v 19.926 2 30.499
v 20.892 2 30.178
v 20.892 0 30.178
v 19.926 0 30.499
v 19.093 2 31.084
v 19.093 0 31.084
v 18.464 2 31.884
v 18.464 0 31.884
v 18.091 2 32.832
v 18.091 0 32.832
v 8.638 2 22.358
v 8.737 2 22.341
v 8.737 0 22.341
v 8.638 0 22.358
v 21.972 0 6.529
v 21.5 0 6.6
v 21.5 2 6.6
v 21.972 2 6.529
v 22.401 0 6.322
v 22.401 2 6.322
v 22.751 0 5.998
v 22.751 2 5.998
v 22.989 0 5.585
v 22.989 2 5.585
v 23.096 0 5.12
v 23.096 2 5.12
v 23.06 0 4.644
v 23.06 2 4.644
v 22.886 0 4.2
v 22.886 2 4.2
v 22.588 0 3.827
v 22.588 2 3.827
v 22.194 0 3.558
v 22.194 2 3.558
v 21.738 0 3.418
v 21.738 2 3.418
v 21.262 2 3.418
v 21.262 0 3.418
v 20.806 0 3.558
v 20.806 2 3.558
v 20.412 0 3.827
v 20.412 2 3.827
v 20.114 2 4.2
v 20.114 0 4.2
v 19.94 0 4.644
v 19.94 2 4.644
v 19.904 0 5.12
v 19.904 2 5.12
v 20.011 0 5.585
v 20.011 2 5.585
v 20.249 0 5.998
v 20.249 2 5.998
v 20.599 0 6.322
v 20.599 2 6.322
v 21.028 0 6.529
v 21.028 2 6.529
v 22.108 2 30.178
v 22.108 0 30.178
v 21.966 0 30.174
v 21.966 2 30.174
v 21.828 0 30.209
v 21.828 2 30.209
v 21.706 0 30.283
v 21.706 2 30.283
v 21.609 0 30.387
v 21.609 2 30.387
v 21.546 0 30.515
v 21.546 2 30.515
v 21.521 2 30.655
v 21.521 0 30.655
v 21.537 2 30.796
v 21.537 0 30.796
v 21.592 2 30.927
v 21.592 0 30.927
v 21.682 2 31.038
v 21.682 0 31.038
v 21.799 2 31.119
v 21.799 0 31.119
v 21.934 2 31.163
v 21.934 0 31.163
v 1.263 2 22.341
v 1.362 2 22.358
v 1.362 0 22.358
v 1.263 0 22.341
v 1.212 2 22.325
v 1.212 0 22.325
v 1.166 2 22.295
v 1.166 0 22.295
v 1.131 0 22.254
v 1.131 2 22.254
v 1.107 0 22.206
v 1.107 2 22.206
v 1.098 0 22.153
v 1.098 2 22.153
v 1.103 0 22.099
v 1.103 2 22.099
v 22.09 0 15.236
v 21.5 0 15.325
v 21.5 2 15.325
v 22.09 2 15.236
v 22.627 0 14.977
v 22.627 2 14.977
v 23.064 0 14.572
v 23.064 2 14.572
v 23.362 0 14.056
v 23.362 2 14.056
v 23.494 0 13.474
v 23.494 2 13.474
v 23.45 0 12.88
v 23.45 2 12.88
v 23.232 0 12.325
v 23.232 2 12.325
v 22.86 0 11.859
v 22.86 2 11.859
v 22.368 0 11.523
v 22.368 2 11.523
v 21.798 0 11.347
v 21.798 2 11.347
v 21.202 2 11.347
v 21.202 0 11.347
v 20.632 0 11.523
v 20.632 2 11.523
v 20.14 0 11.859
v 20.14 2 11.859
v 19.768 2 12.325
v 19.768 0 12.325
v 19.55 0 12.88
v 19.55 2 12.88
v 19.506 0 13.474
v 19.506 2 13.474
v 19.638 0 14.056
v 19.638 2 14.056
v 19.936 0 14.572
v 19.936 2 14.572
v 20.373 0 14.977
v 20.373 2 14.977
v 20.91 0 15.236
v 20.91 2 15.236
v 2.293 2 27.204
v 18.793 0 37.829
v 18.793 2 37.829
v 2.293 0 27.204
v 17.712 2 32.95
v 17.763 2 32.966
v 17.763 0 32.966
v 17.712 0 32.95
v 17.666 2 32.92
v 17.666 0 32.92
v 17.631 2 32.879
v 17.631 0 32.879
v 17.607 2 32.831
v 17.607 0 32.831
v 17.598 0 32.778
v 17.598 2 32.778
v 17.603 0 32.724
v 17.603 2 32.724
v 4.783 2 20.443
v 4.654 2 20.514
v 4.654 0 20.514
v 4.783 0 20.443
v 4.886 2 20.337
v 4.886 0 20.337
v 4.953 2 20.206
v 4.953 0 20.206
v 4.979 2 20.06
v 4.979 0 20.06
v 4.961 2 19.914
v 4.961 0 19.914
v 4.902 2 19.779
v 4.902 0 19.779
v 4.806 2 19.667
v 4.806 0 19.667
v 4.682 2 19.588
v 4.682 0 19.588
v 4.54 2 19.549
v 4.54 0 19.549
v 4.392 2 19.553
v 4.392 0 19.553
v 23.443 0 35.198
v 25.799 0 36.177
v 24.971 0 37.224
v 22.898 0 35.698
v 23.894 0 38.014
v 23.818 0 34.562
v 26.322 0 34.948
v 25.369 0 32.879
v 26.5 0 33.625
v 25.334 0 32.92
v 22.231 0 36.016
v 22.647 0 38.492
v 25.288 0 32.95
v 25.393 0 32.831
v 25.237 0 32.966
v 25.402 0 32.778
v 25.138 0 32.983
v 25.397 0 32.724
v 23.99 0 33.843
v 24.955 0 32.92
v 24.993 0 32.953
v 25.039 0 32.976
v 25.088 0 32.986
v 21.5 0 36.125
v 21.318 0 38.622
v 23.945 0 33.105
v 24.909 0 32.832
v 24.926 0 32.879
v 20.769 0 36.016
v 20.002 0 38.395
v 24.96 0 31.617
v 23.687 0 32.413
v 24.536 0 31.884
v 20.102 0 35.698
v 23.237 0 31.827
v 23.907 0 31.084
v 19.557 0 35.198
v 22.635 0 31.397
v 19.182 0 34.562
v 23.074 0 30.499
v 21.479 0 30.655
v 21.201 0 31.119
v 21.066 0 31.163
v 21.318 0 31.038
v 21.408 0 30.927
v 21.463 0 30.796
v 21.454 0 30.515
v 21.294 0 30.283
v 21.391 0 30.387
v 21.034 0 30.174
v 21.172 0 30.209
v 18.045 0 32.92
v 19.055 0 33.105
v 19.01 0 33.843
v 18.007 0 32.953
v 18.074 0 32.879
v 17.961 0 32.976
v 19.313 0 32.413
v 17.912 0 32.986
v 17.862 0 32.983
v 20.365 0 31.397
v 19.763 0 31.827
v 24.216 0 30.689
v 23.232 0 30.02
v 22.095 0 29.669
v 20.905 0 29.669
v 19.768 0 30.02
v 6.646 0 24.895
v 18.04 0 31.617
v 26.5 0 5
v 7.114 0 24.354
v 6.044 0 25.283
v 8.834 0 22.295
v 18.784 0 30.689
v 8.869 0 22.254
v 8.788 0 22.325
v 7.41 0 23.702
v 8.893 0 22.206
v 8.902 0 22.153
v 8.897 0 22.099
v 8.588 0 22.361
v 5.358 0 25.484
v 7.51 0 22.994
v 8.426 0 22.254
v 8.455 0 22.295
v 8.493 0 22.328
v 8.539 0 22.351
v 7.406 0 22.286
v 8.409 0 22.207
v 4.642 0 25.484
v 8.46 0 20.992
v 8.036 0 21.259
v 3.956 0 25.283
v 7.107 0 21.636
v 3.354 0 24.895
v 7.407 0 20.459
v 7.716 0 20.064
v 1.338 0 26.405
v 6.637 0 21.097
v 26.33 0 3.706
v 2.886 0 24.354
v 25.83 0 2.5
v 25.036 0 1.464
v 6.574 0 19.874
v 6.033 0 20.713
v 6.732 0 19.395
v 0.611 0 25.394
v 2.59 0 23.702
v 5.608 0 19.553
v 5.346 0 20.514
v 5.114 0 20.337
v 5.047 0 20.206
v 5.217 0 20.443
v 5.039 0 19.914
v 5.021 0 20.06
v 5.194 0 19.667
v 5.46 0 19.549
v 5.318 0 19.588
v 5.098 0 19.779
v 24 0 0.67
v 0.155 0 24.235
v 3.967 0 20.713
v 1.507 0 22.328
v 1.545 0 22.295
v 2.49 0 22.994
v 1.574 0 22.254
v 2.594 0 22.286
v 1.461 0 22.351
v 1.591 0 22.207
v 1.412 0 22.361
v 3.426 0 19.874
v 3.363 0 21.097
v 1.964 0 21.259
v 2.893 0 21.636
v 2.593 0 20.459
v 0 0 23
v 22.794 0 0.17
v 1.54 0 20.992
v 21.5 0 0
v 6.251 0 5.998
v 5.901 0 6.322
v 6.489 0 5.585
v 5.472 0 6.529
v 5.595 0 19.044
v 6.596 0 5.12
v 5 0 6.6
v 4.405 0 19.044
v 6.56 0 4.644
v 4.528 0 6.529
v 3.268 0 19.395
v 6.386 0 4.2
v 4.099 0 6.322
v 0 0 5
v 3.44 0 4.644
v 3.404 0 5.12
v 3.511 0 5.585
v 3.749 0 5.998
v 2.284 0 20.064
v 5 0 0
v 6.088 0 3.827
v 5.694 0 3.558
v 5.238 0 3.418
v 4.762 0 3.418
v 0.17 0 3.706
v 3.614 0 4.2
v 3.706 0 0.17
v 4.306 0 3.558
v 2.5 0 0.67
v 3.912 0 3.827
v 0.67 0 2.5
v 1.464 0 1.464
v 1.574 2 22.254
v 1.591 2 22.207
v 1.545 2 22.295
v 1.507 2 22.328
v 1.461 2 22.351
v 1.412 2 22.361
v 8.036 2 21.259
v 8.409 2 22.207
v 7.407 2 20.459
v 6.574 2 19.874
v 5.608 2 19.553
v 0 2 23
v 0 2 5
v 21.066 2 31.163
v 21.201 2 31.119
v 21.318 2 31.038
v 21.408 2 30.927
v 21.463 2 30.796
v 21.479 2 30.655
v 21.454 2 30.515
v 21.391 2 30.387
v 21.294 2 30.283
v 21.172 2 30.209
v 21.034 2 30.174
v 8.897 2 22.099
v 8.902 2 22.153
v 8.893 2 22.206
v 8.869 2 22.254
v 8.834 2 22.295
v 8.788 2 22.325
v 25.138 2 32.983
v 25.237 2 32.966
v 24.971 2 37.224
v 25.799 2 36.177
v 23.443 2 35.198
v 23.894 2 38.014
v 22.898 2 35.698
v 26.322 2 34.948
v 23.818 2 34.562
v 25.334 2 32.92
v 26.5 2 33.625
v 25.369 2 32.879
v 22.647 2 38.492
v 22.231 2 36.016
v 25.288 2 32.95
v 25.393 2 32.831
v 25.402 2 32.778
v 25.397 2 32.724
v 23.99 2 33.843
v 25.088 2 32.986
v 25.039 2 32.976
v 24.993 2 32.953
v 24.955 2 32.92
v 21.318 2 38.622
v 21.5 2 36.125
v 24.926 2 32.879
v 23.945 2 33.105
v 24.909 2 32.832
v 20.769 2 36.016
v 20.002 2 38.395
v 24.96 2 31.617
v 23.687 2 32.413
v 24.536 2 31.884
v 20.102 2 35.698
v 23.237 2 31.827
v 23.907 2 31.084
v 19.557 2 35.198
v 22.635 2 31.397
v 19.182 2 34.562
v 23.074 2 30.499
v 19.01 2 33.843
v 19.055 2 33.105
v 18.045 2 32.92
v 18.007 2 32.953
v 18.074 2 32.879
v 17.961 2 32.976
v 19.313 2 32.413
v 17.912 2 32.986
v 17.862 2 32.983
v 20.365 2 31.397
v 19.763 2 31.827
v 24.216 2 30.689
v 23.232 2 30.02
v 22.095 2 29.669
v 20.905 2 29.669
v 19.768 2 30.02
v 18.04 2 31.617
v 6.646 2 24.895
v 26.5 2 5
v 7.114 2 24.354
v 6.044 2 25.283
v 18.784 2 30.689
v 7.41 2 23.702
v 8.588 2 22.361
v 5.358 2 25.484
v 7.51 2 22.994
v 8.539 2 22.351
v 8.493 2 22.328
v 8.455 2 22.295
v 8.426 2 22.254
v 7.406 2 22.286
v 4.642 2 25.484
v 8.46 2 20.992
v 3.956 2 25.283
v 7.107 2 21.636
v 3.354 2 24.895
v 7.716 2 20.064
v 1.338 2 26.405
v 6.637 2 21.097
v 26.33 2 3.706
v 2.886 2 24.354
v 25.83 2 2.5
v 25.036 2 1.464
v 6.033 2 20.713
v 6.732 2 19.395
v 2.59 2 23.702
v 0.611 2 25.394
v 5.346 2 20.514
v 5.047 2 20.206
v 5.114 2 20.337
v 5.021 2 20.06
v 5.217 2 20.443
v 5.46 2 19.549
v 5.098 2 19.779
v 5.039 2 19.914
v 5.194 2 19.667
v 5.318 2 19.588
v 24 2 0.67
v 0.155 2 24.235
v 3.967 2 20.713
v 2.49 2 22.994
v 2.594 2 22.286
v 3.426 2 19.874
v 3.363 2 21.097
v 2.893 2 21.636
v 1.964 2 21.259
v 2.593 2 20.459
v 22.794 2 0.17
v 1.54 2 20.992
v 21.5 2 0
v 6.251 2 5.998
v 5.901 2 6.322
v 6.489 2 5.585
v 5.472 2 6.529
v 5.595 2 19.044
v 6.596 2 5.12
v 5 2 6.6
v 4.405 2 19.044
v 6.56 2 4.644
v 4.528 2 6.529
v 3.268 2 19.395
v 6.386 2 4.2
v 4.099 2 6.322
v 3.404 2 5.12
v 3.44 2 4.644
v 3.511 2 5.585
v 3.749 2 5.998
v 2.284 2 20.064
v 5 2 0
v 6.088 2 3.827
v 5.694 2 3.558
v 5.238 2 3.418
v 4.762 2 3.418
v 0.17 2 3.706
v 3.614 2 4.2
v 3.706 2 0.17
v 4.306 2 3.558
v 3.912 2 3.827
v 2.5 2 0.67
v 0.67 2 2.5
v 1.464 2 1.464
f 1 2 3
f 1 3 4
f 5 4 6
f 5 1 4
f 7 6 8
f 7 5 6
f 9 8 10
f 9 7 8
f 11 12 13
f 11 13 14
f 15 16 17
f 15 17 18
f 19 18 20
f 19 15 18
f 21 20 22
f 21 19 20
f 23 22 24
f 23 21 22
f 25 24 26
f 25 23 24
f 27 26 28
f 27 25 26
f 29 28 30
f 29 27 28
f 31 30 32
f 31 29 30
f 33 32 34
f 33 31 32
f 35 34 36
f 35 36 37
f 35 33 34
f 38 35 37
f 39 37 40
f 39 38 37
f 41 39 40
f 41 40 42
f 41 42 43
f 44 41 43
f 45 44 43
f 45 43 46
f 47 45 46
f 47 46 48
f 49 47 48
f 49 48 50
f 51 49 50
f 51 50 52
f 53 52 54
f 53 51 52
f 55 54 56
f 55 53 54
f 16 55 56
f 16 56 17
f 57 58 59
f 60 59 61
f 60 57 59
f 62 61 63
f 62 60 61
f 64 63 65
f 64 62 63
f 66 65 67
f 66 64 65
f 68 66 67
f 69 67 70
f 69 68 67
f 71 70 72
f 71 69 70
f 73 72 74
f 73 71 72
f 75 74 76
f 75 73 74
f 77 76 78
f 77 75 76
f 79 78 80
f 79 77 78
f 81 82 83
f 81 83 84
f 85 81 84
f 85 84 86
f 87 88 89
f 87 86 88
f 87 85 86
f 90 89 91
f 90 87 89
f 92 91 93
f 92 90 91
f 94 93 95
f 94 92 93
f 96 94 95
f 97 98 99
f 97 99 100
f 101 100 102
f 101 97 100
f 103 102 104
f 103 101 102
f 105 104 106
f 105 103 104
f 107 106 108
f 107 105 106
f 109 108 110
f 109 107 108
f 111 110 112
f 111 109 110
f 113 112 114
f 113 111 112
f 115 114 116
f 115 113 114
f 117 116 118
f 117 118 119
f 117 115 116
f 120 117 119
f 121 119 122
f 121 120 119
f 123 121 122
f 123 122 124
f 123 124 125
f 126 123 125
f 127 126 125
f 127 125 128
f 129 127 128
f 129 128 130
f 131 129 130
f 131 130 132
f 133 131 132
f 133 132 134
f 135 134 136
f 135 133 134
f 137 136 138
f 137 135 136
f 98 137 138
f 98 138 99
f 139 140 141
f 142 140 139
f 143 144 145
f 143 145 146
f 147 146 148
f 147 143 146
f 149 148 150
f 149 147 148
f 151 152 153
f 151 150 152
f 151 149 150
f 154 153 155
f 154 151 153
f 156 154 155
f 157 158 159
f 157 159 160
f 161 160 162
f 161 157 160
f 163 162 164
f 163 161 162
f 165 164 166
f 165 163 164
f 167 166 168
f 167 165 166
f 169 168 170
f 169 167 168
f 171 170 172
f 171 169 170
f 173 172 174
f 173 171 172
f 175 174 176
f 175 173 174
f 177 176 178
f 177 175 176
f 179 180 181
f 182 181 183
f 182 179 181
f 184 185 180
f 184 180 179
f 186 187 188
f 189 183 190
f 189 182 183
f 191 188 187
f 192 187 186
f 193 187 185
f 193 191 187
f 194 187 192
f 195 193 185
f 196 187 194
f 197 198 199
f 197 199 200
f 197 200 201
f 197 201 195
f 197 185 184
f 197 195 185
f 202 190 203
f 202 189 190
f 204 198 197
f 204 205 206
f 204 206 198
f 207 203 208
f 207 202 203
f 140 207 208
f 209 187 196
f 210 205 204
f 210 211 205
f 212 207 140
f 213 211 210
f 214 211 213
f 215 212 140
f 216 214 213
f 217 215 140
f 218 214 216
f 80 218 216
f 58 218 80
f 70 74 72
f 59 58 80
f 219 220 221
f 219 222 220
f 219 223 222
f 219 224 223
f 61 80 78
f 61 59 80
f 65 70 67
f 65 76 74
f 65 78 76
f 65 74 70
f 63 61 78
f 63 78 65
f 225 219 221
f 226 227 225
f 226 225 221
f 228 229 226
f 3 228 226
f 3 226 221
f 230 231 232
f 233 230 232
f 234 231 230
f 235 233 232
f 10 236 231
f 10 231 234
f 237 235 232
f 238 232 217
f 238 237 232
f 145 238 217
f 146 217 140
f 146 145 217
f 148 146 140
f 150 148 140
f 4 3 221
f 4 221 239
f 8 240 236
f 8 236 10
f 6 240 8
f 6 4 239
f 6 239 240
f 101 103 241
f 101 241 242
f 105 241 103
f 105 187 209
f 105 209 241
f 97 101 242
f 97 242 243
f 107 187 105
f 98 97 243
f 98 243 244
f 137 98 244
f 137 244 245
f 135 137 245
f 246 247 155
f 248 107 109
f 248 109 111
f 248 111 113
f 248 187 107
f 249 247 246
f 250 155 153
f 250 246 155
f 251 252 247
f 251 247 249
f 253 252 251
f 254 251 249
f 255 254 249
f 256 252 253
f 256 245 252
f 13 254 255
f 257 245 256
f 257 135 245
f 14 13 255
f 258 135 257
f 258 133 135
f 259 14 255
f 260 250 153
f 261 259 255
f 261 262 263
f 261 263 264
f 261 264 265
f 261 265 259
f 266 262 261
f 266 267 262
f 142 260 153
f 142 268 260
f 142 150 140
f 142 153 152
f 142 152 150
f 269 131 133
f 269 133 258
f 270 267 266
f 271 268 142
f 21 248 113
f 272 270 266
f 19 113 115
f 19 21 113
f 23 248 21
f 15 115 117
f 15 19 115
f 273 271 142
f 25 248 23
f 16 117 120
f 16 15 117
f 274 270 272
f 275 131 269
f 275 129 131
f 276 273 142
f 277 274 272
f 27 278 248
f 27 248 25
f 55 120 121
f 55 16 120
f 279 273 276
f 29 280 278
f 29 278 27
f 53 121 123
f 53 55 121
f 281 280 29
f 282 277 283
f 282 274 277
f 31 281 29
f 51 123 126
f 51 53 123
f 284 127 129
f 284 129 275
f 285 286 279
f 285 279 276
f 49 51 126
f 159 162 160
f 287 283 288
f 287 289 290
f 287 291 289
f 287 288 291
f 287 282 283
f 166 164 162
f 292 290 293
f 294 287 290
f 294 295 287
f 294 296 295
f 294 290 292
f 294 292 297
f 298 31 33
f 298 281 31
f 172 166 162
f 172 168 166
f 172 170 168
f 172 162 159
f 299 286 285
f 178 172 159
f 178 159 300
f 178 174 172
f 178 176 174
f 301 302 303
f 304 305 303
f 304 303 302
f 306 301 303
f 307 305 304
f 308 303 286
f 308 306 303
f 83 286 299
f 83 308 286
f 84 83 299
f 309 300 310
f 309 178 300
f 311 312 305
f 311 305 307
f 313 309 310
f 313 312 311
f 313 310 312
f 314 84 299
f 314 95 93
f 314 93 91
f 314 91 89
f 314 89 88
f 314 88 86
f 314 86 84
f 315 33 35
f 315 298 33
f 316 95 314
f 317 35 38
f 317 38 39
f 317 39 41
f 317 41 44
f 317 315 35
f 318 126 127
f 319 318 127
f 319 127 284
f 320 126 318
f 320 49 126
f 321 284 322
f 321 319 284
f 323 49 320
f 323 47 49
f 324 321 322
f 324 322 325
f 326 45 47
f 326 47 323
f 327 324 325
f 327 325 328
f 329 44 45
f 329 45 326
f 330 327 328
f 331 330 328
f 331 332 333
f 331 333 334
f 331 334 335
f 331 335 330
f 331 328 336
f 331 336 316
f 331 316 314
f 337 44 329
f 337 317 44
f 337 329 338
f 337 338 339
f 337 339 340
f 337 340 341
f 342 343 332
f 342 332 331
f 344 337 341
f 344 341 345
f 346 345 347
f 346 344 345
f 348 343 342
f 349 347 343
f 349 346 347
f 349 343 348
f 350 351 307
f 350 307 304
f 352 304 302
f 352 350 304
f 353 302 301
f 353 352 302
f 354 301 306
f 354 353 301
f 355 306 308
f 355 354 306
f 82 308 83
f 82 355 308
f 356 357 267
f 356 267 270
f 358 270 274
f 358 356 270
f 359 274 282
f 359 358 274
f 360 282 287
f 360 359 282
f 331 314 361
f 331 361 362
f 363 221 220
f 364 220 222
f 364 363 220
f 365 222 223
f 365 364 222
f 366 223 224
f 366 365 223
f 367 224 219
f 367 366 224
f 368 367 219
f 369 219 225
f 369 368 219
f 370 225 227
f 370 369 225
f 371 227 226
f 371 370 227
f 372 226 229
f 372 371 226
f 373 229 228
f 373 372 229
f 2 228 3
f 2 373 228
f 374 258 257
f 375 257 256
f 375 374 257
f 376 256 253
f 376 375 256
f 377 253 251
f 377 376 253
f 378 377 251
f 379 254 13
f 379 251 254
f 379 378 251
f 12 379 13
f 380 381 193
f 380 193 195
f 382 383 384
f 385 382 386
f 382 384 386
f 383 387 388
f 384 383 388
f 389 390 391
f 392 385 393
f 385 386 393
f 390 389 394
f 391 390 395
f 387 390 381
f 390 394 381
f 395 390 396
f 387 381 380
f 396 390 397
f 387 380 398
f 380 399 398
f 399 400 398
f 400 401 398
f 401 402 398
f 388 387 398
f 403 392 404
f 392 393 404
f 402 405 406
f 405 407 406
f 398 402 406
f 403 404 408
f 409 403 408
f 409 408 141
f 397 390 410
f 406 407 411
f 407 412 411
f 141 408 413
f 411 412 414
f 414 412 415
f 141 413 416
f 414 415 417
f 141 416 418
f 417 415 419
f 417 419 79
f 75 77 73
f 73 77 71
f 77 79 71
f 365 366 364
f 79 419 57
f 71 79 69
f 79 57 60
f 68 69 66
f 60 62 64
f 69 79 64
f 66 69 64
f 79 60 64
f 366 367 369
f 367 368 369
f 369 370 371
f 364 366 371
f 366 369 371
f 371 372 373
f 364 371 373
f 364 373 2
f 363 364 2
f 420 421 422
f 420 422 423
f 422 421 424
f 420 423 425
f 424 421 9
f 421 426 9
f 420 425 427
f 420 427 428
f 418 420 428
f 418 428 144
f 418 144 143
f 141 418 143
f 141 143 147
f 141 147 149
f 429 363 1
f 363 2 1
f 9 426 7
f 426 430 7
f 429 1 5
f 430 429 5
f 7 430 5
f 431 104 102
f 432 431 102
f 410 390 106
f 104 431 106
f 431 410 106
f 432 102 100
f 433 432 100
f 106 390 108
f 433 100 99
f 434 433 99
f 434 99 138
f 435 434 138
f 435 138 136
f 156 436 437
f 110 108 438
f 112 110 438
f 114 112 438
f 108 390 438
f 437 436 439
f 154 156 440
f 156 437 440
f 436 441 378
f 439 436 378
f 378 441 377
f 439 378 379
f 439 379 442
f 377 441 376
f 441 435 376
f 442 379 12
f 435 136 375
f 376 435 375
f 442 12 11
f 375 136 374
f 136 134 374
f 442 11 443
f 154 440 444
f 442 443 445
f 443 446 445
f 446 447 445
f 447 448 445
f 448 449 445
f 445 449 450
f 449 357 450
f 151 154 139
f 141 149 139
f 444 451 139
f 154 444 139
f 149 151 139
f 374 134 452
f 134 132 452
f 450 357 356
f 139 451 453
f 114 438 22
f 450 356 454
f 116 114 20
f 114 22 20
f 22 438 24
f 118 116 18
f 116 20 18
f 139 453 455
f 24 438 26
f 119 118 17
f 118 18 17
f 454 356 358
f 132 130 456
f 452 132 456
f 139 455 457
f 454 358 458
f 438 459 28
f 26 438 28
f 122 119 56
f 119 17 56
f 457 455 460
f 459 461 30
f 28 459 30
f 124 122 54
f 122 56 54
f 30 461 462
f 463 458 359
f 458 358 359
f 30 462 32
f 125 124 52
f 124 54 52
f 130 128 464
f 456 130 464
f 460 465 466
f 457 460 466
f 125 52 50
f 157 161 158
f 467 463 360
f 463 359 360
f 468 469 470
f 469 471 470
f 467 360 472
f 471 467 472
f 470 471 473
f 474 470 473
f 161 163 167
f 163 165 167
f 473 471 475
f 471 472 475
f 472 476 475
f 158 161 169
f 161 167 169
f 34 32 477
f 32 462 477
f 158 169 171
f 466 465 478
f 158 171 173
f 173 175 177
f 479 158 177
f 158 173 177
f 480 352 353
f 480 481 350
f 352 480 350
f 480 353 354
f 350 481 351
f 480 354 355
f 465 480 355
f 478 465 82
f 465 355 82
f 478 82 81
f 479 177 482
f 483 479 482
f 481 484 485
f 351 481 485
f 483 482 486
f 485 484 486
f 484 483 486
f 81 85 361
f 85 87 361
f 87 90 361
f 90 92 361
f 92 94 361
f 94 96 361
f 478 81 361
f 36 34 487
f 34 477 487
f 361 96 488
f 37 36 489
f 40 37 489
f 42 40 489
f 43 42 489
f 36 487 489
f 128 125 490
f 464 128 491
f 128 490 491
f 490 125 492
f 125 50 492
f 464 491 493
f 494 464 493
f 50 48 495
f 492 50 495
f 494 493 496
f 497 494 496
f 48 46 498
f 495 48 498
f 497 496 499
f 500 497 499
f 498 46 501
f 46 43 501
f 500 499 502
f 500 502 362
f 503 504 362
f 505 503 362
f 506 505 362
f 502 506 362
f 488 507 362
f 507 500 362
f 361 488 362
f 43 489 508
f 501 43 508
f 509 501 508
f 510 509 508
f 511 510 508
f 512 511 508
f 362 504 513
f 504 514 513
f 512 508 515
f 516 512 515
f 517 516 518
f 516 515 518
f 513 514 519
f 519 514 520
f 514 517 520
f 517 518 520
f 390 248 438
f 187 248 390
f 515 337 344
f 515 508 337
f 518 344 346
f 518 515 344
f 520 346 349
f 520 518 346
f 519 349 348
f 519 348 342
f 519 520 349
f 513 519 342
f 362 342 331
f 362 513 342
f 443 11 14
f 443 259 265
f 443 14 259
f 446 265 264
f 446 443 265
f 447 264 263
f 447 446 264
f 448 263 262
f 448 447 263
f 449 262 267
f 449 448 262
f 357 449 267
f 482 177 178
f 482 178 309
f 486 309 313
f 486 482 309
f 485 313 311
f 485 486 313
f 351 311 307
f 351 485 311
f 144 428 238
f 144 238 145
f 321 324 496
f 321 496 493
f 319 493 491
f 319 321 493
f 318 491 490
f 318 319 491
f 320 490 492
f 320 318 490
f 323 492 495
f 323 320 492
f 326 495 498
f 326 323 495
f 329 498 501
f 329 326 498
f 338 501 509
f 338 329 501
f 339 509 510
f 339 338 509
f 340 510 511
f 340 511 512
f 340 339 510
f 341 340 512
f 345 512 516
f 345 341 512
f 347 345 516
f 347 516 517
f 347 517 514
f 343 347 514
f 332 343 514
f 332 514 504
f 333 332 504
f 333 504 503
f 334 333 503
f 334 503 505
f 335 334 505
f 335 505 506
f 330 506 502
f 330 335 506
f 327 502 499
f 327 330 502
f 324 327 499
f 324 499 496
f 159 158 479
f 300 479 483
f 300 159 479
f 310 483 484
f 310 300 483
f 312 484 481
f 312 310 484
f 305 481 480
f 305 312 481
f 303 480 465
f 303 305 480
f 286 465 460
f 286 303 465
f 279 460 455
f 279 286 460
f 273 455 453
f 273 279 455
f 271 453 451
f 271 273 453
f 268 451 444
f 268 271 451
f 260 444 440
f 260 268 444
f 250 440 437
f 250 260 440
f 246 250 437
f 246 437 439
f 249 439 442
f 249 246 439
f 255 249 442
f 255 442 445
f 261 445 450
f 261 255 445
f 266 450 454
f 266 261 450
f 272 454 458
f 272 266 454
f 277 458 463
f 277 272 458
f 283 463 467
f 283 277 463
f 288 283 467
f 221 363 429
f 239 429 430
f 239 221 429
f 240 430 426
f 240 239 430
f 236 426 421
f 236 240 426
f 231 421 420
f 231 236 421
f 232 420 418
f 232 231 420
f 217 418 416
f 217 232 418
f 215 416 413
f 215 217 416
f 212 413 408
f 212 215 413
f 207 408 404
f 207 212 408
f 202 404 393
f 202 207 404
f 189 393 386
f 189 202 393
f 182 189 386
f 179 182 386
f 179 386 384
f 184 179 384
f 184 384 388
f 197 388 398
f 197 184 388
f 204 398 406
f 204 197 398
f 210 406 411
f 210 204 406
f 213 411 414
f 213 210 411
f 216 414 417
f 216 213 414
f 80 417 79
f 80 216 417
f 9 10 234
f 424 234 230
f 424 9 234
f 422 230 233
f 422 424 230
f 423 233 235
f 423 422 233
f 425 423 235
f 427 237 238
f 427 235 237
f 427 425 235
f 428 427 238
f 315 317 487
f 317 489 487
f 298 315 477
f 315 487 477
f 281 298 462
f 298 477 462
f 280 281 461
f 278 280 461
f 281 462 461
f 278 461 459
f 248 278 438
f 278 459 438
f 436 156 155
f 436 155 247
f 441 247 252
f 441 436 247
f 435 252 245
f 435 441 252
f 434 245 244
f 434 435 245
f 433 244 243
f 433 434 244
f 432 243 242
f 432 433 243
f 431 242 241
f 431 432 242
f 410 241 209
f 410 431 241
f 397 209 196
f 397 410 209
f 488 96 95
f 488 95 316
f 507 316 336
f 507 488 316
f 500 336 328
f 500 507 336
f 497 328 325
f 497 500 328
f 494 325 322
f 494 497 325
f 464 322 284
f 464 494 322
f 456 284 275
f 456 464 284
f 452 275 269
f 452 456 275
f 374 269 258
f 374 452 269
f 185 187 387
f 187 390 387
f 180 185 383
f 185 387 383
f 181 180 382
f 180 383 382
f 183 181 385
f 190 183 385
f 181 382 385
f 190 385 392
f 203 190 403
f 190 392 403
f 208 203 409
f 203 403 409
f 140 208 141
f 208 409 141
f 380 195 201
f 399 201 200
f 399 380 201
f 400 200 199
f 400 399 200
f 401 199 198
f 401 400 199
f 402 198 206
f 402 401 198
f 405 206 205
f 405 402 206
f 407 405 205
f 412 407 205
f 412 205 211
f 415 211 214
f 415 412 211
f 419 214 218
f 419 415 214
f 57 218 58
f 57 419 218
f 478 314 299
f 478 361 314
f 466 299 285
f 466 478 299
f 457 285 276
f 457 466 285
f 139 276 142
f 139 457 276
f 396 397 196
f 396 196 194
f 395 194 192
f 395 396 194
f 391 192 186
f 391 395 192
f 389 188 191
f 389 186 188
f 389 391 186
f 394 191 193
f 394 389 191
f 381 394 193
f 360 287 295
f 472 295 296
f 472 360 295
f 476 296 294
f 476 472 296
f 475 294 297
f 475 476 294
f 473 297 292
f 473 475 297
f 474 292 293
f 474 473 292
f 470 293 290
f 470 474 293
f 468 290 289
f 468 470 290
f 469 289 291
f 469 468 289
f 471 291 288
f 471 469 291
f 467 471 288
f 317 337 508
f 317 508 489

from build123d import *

# Parameters (mm, degrees)
SKETCH1_R           = 2.51
SKETCH1_R_2         = 2.5
SKETCH1_R_3         = 1.6
SKETCH1_R_4         = 2
BOSS_EXTRUDE1_DEPTH = 2
FILLET1_R           = 5
CUT_EXTRUDE2_DEPTH  = 47.884332404


with BuildPart() as part:
    # Sketch1 → Boss-Extrude1 (new body)
    with BuildSketch(Plane(origin=(0, 0, 0), x_dir=(1, 0, 0), z_dir=(0, 1, 0))):
        Polygon((0, 0), (26.5, 0), (26.5, -42.791666667), (0, -25.727272727), align=None)
        with Locations(Location((5, -23, 0), (0, 0, 270))):
            Circle(SKETCH1_R, mode=Mode.SUBTRACT)
        with Locations(Location((21.5, -33.625, 0), (0, 0, 270))):
            Circle(SKETCH1_R_2, mode=Mode.SUBTRACT)
        with Locations(Location((21.5, -5, 0), (0, 0, 270))):
            Circle(SKETCH1_R_3, mode=Mode.SUBTRACT)
        with Locations(Location((5, -5, 0), (0, 0, 270))):
            Circle(SKETCH1_R_3, mode=Mode.SUBTRACT)
        with Locations(Location((21.5, -13.325, 0), (0, 0, 270))):
            Circle(SKETCH1_R_4, mode=Mode.SUBTRACT)
    extrude(amount=BOSS_EXTRUDE1_DEPTH)

    # Fillet1
    fillet1_edges = [part.edges().sort_by_distance(p)[0] for p in [
        (0, 1, 0),
        (26.5, 1, 0),
        (26.5, 1, 42.791666667),
        (0, 1, 25.727272727),
    ]]
    fillet(fillet1_edges, radius=FILLET1_R)

    # Sketch2 → Cut-Extrude2 (cut, through all)
    with BuildSketch(Plane(origin=(0, 2, 0), x_dir=(1, 0, 0), z_dir=(0, 1, 0))):
        with BuildLine():
            Line((17.861538493, -32.983441068), (17.762917332, -32.966051496))
            ThreePointArc((17.762917332, -32.966051496), (17.630853466, -32.879452656), (17.602786281, -32.724042048))
            ThreePointArc((17.602786281, -32.724042048), (21.5, -29.625), (25.397213719, -32.724042048))
            ThreePointArc((25.397213719, -32.724042048), (25.369146534, -32.879452656), (25.237082668, -32.966051496))
            Line((25.237082668, -32.966051496), (25.138461507, -32.983441068))
            ThreePointArc((25.138461507, -32.983441068), (24.993487988, -32.953351583), (24.908935554, -32.831804949))
            ThreePointArc((24.908935554, -32.831804949), (23.907056069, -31.084118051), (22.107768622, -30.178172864))
            ThreePointArc((22.107768622, -30.178172864), (21.528540656, -30.583752652), (21.934120444, -31.162980617))
            ThreePointArc((21.934120444, -31.162980617), (21.5, -31.125), (21.065879556, -31.162980617))
            ThreePointArc((21.065879556, -31.162980617), (21.471459344, -30.583752652), (20.892231378, -30.178172864))
            ThreePointArc((20.892231378, -30.178172864), (19.092943931, -31.084118051), (18.091064446, -32.831804949))
            ThreePointArc((18.091064446, -32.831804949), (18.006512012, -32.953351583), (17.861538493, -32.983441068))
        make_face()
        with BuildLine():
            Line((1.361538493, -22.358441068), (1.262917332, -22.341051496))
            ThreePointArc((1.262917332, -22.341051496), (1.130853466, -22.254452656), (1.102786281, -22.099042048))
            ThreePointArc((1.102786281, -22.099042048), (5, -19), (8.897213719, -22.099042048))
            ThreePointArc((8.897213719, -22.099042048), (8.869146534, -22.254452656), (8.737082668, -22.341051496))
            Line((8.737082668, -22.341051496), (8.638461507, -22.358441068))
            ThreePointArc((8.638461507, -22.358441068), (8.493487988, -22.328351583), (8.408935554, -22.206804949))
            ThreePointArc((8.408935554, -22.206804949), (7.407056069, -20.459118051), (5.607768622, -19.553172864))
            ThreePointArc((5.607768622, -19.553172864), (5.028540656, -19.958752652), (5.434120444, -20.537980617))
            ThreePointArc((5.434120444, -20.537980617), (5, -20.5), (4.565879556, -20.537980617))
            ThreePointArc((4.565879556, -20.537980617), (4.971459344, -19.958752652), (4.392231378, -19.553172864))
            ThreePointArc((4.392231378, -19.553172864), (2.592943931, -20.459118051), (1.591064446, -22.206804949))
            ThreePointArc((1.591064446, -22.206804949), (1.506512012, -22.328351583), (1.361538493, -22.358441068))
        make_face()
    extrude(amount=-CUT_EXTRUDE2_DEPTH, mode=Mode.SUBTRACT)


solid = part.part
